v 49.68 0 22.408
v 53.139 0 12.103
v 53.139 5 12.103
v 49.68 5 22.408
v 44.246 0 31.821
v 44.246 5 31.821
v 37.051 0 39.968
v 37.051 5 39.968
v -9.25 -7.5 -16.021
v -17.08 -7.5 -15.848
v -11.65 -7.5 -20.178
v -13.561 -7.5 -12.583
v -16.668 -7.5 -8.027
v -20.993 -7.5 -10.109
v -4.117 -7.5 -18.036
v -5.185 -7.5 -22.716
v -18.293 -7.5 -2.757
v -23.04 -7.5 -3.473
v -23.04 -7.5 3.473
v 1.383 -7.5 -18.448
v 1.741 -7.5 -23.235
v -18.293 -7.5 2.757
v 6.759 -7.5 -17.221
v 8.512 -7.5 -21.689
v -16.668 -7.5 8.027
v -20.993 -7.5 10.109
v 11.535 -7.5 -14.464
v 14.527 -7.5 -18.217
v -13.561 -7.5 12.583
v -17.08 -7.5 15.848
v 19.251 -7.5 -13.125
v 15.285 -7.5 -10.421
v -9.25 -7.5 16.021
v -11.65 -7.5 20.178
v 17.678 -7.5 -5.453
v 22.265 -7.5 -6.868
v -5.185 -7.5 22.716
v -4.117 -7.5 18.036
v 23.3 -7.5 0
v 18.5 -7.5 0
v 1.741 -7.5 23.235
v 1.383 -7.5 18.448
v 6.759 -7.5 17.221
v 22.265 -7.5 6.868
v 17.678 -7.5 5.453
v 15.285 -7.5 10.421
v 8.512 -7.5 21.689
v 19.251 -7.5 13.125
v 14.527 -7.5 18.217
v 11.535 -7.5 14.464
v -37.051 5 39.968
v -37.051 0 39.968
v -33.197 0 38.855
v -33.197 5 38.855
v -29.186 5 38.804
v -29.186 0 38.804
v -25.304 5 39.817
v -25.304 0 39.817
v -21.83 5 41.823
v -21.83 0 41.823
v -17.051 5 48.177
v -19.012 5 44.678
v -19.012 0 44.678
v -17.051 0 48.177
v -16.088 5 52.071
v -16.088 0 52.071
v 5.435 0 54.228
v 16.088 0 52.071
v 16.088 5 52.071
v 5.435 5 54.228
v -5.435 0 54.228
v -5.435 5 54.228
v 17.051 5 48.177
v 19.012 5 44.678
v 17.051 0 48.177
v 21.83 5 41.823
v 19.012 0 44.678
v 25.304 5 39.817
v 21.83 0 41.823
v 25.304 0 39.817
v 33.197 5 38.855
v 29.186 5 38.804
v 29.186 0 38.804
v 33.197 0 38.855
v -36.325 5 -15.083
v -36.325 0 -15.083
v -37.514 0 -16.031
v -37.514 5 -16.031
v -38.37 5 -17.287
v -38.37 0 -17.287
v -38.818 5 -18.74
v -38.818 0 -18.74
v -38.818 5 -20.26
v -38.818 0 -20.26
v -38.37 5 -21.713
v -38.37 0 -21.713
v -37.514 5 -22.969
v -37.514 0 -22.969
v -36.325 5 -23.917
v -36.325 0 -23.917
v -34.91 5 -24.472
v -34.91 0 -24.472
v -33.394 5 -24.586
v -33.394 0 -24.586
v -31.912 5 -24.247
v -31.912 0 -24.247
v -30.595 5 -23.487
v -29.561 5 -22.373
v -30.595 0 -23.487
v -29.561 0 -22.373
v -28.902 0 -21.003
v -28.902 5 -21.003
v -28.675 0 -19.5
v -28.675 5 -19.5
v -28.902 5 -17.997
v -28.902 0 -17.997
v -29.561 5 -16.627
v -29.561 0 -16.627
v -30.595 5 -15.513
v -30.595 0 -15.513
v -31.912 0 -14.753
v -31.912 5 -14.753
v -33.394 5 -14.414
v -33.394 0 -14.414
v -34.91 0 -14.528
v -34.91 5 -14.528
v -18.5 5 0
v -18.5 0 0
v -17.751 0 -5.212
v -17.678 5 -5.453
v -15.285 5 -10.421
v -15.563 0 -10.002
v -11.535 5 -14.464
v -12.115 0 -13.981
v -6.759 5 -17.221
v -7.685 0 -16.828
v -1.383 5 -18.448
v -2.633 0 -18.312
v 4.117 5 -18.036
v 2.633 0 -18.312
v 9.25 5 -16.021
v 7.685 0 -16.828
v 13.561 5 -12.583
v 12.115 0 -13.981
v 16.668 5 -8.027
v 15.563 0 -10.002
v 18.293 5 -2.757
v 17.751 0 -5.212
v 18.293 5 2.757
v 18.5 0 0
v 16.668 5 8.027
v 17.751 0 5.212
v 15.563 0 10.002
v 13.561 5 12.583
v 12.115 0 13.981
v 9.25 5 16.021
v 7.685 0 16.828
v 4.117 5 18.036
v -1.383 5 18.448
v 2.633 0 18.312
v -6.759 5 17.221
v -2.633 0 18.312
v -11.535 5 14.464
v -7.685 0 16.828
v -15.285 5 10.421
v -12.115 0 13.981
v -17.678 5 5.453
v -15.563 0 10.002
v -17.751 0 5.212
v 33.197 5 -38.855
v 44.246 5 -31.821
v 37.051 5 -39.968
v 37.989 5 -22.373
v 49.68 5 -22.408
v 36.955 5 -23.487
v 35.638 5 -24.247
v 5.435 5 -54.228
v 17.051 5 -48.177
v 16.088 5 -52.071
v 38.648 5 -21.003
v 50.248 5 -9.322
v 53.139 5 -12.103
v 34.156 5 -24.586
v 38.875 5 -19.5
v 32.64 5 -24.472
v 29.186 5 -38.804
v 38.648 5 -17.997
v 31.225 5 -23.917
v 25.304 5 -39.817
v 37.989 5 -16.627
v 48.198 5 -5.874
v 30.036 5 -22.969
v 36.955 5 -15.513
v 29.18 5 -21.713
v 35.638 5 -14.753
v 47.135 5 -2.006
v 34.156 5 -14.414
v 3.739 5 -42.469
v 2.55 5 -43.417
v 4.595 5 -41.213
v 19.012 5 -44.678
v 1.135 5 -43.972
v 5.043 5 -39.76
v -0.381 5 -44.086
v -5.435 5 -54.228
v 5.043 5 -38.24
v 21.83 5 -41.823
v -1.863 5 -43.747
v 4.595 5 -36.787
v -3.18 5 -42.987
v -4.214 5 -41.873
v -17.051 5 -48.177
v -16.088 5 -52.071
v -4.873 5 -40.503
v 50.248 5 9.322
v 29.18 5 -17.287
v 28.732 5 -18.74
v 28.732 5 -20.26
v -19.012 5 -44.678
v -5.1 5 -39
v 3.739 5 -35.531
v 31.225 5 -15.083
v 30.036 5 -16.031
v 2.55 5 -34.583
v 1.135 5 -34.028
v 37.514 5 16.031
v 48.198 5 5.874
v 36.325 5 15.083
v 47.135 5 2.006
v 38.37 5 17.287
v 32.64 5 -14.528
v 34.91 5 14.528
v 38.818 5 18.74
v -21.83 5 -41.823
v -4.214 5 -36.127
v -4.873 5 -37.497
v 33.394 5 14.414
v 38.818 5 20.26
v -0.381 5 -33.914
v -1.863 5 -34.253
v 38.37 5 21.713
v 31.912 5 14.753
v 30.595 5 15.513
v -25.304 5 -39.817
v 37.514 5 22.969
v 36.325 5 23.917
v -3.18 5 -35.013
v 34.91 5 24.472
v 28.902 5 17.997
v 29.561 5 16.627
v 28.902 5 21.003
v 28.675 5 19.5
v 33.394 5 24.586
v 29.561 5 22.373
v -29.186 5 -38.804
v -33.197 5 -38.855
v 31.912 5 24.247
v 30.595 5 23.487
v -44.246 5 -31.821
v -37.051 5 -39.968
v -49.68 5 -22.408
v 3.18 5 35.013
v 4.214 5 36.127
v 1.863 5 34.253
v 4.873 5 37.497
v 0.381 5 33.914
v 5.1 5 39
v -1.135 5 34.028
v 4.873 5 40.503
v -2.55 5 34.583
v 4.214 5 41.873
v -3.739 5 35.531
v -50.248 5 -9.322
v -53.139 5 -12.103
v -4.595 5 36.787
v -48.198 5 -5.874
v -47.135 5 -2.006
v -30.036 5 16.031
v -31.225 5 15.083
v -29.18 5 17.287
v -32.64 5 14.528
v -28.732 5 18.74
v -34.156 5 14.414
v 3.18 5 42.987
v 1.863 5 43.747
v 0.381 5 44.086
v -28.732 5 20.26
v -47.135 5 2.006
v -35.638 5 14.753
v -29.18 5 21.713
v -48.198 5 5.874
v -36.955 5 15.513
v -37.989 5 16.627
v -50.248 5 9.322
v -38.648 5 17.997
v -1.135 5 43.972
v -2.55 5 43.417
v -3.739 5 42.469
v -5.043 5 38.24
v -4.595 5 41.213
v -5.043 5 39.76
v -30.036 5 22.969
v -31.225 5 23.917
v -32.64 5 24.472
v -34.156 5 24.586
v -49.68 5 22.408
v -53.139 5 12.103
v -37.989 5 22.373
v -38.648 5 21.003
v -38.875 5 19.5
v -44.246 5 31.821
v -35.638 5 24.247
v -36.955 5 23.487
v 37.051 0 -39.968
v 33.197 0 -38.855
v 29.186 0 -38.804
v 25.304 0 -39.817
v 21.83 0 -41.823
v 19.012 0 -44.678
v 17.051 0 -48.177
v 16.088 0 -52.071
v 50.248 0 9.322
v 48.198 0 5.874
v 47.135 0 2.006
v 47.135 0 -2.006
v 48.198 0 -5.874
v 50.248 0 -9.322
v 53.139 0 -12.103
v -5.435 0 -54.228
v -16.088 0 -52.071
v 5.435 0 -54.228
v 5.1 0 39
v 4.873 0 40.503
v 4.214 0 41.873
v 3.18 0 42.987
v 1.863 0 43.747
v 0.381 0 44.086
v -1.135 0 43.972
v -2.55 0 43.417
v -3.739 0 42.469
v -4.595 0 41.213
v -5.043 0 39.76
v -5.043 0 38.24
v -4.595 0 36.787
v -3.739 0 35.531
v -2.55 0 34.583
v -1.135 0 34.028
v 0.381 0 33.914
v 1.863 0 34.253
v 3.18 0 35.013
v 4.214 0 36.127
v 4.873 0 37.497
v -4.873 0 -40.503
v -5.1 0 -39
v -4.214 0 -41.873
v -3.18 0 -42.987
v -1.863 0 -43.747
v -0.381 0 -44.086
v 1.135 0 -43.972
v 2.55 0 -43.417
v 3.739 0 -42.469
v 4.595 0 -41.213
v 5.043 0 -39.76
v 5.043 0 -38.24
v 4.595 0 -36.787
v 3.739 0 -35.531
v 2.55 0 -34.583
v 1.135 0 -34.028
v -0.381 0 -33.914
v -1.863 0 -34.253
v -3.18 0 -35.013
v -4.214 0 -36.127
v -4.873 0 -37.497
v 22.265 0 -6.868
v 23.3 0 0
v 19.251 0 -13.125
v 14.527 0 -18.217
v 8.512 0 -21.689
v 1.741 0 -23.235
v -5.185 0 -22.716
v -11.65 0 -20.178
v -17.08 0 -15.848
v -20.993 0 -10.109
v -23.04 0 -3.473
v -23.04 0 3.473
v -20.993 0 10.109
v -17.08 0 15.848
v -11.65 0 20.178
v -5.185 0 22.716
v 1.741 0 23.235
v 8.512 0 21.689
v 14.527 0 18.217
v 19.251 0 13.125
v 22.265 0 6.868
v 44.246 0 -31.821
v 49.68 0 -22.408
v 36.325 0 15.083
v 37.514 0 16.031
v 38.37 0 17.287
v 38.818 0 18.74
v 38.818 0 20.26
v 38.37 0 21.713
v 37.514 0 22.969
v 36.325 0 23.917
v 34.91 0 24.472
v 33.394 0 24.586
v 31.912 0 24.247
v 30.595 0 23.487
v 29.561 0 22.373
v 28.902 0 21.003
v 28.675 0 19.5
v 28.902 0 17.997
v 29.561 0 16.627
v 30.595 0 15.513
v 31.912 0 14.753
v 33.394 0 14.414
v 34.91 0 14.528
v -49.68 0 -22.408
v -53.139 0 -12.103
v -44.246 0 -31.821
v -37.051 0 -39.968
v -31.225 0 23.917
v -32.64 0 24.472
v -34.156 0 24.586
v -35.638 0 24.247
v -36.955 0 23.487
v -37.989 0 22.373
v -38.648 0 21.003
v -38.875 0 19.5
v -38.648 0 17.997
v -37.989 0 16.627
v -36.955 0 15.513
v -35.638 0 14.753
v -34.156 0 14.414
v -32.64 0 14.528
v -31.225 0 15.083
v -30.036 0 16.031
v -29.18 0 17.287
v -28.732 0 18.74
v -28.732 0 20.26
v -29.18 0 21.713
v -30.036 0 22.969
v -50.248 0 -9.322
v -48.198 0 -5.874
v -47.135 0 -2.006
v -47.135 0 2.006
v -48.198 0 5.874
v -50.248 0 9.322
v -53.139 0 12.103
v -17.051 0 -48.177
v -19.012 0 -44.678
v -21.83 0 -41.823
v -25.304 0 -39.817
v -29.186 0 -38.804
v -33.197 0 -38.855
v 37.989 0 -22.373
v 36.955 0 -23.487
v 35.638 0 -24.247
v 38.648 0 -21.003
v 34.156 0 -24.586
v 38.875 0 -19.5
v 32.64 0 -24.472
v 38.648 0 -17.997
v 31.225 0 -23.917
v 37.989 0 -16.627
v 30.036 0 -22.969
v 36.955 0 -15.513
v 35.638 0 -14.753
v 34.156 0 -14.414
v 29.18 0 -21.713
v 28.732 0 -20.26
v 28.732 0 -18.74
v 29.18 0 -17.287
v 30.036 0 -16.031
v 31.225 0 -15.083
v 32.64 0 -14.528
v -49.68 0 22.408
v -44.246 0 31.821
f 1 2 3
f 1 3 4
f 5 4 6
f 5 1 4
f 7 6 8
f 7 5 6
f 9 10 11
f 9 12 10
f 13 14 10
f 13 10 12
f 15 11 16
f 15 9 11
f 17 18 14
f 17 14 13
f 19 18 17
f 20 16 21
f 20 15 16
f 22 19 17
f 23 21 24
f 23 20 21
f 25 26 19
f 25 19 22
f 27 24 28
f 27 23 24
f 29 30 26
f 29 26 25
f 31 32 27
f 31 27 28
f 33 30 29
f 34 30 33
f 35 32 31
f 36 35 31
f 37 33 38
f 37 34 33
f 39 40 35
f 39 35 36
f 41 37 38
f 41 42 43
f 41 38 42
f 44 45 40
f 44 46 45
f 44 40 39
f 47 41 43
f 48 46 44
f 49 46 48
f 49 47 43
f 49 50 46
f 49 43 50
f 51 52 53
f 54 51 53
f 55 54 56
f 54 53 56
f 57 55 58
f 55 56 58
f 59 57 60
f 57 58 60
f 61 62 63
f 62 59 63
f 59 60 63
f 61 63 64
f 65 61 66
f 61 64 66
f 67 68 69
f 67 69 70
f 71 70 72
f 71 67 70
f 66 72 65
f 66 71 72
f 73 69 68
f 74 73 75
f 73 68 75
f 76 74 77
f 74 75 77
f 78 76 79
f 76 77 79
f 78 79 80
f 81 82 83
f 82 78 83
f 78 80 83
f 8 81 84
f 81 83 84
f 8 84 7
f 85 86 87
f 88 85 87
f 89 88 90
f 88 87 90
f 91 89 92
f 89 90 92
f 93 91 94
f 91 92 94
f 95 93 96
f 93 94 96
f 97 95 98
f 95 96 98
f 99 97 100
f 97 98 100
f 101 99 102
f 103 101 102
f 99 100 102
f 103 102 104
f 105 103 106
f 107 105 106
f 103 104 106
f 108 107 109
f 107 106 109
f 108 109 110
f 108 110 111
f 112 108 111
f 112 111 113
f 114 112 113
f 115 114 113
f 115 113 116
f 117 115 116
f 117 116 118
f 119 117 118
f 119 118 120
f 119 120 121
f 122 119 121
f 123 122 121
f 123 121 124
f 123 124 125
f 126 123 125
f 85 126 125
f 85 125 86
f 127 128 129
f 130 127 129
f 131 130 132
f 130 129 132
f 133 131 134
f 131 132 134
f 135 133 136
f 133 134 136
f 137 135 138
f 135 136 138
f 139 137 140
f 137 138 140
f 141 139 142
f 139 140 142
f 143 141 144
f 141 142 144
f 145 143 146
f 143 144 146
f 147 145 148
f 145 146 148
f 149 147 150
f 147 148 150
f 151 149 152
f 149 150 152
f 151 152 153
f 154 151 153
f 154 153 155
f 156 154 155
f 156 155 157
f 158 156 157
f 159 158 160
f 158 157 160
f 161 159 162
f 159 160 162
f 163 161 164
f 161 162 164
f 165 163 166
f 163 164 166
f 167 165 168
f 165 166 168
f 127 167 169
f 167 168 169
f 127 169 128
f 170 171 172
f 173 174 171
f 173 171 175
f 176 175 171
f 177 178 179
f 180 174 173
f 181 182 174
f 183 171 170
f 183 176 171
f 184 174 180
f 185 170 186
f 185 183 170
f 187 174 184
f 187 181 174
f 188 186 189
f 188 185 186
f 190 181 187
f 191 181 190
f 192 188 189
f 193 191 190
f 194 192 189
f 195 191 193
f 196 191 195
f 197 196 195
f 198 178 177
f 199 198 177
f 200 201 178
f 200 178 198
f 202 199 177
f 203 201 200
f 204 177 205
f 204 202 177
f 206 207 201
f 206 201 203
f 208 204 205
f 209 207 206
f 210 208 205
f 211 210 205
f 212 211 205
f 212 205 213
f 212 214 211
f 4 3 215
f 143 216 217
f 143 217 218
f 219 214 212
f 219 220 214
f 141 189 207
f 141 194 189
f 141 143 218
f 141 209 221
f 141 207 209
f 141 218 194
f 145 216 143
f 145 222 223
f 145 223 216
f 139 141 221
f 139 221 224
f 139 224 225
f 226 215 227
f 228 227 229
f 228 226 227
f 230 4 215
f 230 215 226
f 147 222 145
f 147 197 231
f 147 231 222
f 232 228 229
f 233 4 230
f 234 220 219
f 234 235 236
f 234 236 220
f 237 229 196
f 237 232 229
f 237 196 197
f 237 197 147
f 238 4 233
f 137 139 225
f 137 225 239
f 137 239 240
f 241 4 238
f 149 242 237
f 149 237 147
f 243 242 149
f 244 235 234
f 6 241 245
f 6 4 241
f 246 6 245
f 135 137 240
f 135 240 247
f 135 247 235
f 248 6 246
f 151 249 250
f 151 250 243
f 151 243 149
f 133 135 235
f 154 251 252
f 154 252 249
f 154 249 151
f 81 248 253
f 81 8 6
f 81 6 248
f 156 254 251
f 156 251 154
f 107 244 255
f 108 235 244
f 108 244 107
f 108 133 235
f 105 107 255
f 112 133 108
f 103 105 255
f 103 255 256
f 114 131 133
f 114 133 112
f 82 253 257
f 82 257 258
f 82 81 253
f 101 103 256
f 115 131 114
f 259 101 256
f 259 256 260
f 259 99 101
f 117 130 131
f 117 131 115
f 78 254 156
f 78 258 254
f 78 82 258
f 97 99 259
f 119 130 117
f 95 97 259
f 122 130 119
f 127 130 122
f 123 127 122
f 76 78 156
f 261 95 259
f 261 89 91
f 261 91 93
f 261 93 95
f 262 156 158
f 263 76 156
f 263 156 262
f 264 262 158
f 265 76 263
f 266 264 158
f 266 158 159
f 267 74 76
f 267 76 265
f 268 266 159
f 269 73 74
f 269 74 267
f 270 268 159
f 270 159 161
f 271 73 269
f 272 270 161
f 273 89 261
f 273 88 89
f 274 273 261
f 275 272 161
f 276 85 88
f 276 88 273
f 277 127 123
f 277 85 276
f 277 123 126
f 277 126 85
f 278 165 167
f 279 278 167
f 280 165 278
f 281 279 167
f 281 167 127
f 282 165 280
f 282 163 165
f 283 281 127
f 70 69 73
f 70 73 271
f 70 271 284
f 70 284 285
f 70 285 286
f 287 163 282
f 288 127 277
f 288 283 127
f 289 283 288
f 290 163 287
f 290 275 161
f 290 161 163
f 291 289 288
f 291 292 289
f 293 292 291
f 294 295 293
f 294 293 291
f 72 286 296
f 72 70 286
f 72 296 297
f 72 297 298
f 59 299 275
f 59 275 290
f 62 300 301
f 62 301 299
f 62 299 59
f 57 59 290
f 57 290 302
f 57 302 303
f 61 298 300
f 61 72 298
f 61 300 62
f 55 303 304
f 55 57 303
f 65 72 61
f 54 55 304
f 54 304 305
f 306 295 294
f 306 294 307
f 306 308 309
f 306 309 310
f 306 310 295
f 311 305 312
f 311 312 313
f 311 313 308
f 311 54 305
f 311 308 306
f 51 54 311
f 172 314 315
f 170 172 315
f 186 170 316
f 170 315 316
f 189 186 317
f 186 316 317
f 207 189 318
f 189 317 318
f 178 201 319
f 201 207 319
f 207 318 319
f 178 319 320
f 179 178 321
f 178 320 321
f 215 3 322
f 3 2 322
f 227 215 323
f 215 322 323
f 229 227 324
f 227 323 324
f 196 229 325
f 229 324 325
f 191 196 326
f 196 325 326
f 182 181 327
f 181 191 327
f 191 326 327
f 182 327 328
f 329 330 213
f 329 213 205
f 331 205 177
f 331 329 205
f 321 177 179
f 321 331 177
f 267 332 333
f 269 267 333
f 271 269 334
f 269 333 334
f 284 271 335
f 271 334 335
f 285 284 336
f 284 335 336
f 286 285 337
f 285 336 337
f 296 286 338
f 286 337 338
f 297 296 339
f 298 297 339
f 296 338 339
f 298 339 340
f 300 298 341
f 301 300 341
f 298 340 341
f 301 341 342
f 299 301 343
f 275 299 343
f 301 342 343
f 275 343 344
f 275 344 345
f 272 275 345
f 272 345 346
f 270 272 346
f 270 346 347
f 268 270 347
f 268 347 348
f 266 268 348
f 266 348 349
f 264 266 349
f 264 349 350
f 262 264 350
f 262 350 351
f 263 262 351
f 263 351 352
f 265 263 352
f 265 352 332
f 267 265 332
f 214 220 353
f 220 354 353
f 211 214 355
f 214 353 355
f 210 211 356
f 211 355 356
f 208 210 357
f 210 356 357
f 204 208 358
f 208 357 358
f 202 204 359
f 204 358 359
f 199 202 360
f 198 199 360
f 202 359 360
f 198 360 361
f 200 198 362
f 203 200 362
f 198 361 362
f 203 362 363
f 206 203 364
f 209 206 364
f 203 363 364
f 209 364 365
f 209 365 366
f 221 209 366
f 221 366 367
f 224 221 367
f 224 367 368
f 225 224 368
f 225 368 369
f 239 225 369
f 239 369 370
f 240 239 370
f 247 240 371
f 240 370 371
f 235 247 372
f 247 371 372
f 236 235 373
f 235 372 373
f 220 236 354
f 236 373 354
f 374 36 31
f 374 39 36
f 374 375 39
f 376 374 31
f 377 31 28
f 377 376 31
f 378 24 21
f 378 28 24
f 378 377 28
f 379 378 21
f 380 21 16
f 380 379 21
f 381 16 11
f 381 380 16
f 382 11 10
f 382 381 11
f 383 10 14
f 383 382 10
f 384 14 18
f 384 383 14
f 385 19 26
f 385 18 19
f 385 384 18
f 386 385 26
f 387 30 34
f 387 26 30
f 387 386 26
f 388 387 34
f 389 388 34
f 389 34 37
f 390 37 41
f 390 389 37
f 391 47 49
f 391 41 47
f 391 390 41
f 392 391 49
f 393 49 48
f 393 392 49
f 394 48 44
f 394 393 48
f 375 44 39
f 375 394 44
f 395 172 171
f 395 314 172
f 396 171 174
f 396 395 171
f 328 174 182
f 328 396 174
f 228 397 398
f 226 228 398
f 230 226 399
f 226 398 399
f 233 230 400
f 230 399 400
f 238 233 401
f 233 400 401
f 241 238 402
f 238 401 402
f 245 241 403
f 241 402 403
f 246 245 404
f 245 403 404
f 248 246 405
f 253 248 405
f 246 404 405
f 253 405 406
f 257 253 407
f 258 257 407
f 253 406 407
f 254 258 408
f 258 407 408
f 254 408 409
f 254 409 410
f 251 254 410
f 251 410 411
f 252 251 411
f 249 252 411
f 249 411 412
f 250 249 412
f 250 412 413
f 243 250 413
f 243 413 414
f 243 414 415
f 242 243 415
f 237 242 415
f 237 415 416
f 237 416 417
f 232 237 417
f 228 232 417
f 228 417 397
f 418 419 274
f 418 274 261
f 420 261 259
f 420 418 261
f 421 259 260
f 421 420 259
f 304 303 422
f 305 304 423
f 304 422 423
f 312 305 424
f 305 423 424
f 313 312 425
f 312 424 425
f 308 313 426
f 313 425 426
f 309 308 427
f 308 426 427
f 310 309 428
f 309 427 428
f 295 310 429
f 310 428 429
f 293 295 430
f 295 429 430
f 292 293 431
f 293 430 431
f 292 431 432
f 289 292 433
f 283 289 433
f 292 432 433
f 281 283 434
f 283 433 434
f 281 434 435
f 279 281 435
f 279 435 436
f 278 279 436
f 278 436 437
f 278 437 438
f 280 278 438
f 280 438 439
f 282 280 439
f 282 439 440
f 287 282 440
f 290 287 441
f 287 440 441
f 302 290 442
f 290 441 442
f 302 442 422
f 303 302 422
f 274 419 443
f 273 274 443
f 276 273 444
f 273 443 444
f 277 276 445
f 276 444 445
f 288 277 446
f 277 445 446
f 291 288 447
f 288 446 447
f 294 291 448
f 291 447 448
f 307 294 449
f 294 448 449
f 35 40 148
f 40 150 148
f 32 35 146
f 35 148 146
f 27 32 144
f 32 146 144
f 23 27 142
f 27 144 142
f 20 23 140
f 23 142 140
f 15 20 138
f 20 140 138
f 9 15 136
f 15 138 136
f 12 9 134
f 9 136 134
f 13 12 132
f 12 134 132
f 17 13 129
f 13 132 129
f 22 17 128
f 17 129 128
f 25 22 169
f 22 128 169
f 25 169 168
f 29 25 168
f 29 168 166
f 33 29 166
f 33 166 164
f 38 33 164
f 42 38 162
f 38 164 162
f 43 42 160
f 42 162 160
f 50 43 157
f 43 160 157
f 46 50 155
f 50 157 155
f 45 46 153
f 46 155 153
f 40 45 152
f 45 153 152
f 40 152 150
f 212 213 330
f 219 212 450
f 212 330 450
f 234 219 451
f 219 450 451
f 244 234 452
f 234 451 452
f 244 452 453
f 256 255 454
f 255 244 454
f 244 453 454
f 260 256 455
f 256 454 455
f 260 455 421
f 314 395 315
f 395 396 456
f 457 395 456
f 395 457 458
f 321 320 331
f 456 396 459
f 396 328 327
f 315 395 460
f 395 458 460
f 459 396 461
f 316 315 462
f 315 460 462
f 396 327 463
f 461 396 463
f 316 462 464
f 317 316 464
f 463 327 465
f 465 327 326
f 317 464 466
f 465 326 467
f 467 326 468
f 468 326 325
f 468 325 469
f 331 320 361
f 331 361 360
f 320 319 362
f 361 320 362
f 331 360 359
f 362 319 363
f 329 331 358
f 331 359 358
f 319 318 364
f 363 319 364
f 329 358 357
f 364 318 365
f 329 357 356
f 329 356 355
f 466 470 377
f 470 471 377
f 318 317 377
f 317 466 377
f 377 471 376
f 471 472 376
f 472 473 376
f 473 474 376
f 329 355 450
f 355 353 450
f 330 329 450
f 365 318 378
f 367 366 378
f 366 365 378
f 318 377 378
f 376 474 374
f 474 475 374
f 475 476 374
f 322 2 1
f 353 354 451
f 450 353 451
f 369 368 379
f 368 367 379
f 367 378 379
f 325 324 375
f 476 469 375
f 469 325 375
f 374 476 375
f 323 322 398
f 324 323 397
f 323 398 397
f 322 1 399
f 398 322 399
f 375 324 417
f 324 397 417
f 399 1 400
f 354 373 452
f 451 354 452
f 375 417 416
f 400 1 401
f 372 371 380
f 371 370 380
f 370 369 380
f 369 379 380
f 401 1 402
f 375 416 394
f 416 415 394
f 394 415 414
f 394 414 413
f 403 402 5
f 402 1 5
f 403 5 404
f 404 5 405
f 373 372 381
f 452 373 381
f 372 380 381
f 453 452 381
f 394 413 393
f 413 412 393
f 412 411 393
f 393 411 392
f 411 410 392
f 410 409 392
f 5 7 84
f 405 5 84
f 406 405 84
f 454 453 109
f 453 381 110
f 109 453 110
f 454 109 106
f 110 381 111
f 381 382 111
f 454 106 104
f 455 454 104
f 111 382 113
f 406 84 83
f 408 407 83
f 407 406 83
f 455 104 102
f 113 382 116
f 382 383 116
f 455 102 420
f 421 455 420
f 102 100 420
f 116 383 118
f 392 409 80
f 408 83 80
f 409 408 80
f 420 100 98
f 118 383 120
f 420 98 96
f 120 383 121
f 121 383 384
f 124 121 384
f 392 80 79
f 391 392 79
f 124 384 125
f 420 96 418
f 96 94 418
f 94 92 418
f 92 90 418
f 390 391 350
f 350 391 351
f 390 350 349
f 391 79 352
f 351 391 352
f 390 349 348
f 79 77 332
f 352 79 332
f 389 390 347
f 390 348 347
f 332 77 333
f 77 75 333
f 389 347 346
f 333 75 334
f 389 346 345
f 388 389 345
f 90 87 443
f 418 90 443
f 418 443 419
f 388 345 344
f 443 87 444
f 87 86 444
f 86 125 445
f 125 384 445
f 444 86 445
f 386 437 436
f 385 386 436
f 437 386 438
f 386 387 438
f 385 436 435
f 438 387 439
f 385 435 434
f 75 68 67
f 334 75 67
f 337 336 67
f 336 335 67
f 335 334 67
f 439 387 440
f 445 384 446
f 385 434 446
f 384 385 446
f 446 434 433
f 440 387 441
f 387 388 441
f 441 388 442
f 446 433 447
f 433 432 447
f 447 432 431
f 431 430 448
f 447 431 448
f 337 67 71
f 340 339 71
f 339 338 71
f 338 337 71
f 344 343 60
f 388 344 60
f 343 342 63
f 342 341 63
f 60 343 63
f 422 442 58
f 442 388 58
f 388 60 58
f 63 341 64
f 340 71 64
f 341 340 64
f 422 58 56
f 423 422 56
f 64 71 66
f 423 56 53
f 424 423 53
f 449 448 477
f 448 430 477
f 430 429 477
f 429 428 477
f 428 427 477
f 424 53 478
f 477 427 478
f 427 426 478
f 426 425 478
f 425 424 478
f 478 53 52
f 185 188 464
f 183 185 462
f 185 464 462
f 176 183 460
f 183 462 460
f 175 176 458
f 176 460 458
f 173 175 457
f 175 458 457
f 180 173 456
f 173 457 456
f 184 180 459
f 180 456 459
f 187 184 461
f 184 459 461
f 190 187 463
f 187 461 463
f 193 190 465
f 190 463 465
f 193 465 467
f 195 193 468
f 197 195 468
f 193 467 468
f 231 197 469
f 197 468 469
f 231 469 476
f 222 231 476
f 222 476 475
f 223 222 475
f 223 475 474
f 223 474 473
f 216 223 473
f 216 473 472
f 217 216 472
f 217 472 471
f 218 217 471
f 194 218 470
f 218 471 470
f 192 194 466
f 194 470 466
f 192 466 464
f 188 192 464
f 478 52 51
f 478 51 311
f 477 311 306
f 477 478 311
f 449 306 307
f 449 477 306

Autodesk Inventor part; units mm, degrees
ref_plane "YZ Plane" through (0, 0, 0) normal (1, 0, 0) x (0, 1, 0)
ref_plane "XZ Plane" through (0, 0, 0) normal (0, 1, 0) x (-1, 0, 0)
ref_plane "XY Plane" through (0, 0, 0) normal (0, 0, 1) x (1, 0, 0)
sketch "Sketch1" plane through (0, 0, 0) normal (0, 1, 0) x (-1, 0, 0)
  circle A0 centre (0, 0) radius 18.5
  circle A1 centre (0, 0) radius 39 construction
  circle A2 centre (0, -39) radius 5.1
  circle A3 centre (0, 0) radius 54.5
  circle A4 centre (0, 0) radius 62 construction
  circle A5 centre (-62, 0) radius 15
  dimension "d1" = 78
  dimension "d11" = 124
  dimension "d0" = 37
  dimension "d2" = 10.2
  dimension "d3" = 109
  dimension "d12" = 30
extrude "Extrusion1" add sketch "Sketch1" along normal blind 5 contours A2 | A3 A5 | A5 A3 picked at (16.1327, -31.6474) picked at (-51.8988, 0)
extrude "Extrusion2" cut sketch "Sketch1" along normal through all contours A2
pattern_circular "Circular Pattern1" count 6 over 360 about axis through (0, 0, 0) along (0, 1, 0) of "Extrusion2"
extrude "Extrusion3" cut sketch "Sketch1" along normal through all contours A5 A3 | A3 A5 picked at (-51.8988, 0) picked at (-61.8988, 0)
pattern_circular "Circular Pattern2" count 6 over 360 about axis through (0, 0, 0) along (0, 1, 0) of "Extrusion3"
sketch "Sketch2" plane through (0, 0, 0) normal (0, -1, 0) x (1, 0, 0)
  circle A0 centre (0, 0) radius 23.3
  circle A1 centre (0, 0) radius 18.5
  dimension "d18" = 46.6
  dimension "d19" = 37
extrude "Extrusion4" add sketch "Sketch2" along normal blind 7.5
properties part number "HELP_6204BEARING_CASE_B"
